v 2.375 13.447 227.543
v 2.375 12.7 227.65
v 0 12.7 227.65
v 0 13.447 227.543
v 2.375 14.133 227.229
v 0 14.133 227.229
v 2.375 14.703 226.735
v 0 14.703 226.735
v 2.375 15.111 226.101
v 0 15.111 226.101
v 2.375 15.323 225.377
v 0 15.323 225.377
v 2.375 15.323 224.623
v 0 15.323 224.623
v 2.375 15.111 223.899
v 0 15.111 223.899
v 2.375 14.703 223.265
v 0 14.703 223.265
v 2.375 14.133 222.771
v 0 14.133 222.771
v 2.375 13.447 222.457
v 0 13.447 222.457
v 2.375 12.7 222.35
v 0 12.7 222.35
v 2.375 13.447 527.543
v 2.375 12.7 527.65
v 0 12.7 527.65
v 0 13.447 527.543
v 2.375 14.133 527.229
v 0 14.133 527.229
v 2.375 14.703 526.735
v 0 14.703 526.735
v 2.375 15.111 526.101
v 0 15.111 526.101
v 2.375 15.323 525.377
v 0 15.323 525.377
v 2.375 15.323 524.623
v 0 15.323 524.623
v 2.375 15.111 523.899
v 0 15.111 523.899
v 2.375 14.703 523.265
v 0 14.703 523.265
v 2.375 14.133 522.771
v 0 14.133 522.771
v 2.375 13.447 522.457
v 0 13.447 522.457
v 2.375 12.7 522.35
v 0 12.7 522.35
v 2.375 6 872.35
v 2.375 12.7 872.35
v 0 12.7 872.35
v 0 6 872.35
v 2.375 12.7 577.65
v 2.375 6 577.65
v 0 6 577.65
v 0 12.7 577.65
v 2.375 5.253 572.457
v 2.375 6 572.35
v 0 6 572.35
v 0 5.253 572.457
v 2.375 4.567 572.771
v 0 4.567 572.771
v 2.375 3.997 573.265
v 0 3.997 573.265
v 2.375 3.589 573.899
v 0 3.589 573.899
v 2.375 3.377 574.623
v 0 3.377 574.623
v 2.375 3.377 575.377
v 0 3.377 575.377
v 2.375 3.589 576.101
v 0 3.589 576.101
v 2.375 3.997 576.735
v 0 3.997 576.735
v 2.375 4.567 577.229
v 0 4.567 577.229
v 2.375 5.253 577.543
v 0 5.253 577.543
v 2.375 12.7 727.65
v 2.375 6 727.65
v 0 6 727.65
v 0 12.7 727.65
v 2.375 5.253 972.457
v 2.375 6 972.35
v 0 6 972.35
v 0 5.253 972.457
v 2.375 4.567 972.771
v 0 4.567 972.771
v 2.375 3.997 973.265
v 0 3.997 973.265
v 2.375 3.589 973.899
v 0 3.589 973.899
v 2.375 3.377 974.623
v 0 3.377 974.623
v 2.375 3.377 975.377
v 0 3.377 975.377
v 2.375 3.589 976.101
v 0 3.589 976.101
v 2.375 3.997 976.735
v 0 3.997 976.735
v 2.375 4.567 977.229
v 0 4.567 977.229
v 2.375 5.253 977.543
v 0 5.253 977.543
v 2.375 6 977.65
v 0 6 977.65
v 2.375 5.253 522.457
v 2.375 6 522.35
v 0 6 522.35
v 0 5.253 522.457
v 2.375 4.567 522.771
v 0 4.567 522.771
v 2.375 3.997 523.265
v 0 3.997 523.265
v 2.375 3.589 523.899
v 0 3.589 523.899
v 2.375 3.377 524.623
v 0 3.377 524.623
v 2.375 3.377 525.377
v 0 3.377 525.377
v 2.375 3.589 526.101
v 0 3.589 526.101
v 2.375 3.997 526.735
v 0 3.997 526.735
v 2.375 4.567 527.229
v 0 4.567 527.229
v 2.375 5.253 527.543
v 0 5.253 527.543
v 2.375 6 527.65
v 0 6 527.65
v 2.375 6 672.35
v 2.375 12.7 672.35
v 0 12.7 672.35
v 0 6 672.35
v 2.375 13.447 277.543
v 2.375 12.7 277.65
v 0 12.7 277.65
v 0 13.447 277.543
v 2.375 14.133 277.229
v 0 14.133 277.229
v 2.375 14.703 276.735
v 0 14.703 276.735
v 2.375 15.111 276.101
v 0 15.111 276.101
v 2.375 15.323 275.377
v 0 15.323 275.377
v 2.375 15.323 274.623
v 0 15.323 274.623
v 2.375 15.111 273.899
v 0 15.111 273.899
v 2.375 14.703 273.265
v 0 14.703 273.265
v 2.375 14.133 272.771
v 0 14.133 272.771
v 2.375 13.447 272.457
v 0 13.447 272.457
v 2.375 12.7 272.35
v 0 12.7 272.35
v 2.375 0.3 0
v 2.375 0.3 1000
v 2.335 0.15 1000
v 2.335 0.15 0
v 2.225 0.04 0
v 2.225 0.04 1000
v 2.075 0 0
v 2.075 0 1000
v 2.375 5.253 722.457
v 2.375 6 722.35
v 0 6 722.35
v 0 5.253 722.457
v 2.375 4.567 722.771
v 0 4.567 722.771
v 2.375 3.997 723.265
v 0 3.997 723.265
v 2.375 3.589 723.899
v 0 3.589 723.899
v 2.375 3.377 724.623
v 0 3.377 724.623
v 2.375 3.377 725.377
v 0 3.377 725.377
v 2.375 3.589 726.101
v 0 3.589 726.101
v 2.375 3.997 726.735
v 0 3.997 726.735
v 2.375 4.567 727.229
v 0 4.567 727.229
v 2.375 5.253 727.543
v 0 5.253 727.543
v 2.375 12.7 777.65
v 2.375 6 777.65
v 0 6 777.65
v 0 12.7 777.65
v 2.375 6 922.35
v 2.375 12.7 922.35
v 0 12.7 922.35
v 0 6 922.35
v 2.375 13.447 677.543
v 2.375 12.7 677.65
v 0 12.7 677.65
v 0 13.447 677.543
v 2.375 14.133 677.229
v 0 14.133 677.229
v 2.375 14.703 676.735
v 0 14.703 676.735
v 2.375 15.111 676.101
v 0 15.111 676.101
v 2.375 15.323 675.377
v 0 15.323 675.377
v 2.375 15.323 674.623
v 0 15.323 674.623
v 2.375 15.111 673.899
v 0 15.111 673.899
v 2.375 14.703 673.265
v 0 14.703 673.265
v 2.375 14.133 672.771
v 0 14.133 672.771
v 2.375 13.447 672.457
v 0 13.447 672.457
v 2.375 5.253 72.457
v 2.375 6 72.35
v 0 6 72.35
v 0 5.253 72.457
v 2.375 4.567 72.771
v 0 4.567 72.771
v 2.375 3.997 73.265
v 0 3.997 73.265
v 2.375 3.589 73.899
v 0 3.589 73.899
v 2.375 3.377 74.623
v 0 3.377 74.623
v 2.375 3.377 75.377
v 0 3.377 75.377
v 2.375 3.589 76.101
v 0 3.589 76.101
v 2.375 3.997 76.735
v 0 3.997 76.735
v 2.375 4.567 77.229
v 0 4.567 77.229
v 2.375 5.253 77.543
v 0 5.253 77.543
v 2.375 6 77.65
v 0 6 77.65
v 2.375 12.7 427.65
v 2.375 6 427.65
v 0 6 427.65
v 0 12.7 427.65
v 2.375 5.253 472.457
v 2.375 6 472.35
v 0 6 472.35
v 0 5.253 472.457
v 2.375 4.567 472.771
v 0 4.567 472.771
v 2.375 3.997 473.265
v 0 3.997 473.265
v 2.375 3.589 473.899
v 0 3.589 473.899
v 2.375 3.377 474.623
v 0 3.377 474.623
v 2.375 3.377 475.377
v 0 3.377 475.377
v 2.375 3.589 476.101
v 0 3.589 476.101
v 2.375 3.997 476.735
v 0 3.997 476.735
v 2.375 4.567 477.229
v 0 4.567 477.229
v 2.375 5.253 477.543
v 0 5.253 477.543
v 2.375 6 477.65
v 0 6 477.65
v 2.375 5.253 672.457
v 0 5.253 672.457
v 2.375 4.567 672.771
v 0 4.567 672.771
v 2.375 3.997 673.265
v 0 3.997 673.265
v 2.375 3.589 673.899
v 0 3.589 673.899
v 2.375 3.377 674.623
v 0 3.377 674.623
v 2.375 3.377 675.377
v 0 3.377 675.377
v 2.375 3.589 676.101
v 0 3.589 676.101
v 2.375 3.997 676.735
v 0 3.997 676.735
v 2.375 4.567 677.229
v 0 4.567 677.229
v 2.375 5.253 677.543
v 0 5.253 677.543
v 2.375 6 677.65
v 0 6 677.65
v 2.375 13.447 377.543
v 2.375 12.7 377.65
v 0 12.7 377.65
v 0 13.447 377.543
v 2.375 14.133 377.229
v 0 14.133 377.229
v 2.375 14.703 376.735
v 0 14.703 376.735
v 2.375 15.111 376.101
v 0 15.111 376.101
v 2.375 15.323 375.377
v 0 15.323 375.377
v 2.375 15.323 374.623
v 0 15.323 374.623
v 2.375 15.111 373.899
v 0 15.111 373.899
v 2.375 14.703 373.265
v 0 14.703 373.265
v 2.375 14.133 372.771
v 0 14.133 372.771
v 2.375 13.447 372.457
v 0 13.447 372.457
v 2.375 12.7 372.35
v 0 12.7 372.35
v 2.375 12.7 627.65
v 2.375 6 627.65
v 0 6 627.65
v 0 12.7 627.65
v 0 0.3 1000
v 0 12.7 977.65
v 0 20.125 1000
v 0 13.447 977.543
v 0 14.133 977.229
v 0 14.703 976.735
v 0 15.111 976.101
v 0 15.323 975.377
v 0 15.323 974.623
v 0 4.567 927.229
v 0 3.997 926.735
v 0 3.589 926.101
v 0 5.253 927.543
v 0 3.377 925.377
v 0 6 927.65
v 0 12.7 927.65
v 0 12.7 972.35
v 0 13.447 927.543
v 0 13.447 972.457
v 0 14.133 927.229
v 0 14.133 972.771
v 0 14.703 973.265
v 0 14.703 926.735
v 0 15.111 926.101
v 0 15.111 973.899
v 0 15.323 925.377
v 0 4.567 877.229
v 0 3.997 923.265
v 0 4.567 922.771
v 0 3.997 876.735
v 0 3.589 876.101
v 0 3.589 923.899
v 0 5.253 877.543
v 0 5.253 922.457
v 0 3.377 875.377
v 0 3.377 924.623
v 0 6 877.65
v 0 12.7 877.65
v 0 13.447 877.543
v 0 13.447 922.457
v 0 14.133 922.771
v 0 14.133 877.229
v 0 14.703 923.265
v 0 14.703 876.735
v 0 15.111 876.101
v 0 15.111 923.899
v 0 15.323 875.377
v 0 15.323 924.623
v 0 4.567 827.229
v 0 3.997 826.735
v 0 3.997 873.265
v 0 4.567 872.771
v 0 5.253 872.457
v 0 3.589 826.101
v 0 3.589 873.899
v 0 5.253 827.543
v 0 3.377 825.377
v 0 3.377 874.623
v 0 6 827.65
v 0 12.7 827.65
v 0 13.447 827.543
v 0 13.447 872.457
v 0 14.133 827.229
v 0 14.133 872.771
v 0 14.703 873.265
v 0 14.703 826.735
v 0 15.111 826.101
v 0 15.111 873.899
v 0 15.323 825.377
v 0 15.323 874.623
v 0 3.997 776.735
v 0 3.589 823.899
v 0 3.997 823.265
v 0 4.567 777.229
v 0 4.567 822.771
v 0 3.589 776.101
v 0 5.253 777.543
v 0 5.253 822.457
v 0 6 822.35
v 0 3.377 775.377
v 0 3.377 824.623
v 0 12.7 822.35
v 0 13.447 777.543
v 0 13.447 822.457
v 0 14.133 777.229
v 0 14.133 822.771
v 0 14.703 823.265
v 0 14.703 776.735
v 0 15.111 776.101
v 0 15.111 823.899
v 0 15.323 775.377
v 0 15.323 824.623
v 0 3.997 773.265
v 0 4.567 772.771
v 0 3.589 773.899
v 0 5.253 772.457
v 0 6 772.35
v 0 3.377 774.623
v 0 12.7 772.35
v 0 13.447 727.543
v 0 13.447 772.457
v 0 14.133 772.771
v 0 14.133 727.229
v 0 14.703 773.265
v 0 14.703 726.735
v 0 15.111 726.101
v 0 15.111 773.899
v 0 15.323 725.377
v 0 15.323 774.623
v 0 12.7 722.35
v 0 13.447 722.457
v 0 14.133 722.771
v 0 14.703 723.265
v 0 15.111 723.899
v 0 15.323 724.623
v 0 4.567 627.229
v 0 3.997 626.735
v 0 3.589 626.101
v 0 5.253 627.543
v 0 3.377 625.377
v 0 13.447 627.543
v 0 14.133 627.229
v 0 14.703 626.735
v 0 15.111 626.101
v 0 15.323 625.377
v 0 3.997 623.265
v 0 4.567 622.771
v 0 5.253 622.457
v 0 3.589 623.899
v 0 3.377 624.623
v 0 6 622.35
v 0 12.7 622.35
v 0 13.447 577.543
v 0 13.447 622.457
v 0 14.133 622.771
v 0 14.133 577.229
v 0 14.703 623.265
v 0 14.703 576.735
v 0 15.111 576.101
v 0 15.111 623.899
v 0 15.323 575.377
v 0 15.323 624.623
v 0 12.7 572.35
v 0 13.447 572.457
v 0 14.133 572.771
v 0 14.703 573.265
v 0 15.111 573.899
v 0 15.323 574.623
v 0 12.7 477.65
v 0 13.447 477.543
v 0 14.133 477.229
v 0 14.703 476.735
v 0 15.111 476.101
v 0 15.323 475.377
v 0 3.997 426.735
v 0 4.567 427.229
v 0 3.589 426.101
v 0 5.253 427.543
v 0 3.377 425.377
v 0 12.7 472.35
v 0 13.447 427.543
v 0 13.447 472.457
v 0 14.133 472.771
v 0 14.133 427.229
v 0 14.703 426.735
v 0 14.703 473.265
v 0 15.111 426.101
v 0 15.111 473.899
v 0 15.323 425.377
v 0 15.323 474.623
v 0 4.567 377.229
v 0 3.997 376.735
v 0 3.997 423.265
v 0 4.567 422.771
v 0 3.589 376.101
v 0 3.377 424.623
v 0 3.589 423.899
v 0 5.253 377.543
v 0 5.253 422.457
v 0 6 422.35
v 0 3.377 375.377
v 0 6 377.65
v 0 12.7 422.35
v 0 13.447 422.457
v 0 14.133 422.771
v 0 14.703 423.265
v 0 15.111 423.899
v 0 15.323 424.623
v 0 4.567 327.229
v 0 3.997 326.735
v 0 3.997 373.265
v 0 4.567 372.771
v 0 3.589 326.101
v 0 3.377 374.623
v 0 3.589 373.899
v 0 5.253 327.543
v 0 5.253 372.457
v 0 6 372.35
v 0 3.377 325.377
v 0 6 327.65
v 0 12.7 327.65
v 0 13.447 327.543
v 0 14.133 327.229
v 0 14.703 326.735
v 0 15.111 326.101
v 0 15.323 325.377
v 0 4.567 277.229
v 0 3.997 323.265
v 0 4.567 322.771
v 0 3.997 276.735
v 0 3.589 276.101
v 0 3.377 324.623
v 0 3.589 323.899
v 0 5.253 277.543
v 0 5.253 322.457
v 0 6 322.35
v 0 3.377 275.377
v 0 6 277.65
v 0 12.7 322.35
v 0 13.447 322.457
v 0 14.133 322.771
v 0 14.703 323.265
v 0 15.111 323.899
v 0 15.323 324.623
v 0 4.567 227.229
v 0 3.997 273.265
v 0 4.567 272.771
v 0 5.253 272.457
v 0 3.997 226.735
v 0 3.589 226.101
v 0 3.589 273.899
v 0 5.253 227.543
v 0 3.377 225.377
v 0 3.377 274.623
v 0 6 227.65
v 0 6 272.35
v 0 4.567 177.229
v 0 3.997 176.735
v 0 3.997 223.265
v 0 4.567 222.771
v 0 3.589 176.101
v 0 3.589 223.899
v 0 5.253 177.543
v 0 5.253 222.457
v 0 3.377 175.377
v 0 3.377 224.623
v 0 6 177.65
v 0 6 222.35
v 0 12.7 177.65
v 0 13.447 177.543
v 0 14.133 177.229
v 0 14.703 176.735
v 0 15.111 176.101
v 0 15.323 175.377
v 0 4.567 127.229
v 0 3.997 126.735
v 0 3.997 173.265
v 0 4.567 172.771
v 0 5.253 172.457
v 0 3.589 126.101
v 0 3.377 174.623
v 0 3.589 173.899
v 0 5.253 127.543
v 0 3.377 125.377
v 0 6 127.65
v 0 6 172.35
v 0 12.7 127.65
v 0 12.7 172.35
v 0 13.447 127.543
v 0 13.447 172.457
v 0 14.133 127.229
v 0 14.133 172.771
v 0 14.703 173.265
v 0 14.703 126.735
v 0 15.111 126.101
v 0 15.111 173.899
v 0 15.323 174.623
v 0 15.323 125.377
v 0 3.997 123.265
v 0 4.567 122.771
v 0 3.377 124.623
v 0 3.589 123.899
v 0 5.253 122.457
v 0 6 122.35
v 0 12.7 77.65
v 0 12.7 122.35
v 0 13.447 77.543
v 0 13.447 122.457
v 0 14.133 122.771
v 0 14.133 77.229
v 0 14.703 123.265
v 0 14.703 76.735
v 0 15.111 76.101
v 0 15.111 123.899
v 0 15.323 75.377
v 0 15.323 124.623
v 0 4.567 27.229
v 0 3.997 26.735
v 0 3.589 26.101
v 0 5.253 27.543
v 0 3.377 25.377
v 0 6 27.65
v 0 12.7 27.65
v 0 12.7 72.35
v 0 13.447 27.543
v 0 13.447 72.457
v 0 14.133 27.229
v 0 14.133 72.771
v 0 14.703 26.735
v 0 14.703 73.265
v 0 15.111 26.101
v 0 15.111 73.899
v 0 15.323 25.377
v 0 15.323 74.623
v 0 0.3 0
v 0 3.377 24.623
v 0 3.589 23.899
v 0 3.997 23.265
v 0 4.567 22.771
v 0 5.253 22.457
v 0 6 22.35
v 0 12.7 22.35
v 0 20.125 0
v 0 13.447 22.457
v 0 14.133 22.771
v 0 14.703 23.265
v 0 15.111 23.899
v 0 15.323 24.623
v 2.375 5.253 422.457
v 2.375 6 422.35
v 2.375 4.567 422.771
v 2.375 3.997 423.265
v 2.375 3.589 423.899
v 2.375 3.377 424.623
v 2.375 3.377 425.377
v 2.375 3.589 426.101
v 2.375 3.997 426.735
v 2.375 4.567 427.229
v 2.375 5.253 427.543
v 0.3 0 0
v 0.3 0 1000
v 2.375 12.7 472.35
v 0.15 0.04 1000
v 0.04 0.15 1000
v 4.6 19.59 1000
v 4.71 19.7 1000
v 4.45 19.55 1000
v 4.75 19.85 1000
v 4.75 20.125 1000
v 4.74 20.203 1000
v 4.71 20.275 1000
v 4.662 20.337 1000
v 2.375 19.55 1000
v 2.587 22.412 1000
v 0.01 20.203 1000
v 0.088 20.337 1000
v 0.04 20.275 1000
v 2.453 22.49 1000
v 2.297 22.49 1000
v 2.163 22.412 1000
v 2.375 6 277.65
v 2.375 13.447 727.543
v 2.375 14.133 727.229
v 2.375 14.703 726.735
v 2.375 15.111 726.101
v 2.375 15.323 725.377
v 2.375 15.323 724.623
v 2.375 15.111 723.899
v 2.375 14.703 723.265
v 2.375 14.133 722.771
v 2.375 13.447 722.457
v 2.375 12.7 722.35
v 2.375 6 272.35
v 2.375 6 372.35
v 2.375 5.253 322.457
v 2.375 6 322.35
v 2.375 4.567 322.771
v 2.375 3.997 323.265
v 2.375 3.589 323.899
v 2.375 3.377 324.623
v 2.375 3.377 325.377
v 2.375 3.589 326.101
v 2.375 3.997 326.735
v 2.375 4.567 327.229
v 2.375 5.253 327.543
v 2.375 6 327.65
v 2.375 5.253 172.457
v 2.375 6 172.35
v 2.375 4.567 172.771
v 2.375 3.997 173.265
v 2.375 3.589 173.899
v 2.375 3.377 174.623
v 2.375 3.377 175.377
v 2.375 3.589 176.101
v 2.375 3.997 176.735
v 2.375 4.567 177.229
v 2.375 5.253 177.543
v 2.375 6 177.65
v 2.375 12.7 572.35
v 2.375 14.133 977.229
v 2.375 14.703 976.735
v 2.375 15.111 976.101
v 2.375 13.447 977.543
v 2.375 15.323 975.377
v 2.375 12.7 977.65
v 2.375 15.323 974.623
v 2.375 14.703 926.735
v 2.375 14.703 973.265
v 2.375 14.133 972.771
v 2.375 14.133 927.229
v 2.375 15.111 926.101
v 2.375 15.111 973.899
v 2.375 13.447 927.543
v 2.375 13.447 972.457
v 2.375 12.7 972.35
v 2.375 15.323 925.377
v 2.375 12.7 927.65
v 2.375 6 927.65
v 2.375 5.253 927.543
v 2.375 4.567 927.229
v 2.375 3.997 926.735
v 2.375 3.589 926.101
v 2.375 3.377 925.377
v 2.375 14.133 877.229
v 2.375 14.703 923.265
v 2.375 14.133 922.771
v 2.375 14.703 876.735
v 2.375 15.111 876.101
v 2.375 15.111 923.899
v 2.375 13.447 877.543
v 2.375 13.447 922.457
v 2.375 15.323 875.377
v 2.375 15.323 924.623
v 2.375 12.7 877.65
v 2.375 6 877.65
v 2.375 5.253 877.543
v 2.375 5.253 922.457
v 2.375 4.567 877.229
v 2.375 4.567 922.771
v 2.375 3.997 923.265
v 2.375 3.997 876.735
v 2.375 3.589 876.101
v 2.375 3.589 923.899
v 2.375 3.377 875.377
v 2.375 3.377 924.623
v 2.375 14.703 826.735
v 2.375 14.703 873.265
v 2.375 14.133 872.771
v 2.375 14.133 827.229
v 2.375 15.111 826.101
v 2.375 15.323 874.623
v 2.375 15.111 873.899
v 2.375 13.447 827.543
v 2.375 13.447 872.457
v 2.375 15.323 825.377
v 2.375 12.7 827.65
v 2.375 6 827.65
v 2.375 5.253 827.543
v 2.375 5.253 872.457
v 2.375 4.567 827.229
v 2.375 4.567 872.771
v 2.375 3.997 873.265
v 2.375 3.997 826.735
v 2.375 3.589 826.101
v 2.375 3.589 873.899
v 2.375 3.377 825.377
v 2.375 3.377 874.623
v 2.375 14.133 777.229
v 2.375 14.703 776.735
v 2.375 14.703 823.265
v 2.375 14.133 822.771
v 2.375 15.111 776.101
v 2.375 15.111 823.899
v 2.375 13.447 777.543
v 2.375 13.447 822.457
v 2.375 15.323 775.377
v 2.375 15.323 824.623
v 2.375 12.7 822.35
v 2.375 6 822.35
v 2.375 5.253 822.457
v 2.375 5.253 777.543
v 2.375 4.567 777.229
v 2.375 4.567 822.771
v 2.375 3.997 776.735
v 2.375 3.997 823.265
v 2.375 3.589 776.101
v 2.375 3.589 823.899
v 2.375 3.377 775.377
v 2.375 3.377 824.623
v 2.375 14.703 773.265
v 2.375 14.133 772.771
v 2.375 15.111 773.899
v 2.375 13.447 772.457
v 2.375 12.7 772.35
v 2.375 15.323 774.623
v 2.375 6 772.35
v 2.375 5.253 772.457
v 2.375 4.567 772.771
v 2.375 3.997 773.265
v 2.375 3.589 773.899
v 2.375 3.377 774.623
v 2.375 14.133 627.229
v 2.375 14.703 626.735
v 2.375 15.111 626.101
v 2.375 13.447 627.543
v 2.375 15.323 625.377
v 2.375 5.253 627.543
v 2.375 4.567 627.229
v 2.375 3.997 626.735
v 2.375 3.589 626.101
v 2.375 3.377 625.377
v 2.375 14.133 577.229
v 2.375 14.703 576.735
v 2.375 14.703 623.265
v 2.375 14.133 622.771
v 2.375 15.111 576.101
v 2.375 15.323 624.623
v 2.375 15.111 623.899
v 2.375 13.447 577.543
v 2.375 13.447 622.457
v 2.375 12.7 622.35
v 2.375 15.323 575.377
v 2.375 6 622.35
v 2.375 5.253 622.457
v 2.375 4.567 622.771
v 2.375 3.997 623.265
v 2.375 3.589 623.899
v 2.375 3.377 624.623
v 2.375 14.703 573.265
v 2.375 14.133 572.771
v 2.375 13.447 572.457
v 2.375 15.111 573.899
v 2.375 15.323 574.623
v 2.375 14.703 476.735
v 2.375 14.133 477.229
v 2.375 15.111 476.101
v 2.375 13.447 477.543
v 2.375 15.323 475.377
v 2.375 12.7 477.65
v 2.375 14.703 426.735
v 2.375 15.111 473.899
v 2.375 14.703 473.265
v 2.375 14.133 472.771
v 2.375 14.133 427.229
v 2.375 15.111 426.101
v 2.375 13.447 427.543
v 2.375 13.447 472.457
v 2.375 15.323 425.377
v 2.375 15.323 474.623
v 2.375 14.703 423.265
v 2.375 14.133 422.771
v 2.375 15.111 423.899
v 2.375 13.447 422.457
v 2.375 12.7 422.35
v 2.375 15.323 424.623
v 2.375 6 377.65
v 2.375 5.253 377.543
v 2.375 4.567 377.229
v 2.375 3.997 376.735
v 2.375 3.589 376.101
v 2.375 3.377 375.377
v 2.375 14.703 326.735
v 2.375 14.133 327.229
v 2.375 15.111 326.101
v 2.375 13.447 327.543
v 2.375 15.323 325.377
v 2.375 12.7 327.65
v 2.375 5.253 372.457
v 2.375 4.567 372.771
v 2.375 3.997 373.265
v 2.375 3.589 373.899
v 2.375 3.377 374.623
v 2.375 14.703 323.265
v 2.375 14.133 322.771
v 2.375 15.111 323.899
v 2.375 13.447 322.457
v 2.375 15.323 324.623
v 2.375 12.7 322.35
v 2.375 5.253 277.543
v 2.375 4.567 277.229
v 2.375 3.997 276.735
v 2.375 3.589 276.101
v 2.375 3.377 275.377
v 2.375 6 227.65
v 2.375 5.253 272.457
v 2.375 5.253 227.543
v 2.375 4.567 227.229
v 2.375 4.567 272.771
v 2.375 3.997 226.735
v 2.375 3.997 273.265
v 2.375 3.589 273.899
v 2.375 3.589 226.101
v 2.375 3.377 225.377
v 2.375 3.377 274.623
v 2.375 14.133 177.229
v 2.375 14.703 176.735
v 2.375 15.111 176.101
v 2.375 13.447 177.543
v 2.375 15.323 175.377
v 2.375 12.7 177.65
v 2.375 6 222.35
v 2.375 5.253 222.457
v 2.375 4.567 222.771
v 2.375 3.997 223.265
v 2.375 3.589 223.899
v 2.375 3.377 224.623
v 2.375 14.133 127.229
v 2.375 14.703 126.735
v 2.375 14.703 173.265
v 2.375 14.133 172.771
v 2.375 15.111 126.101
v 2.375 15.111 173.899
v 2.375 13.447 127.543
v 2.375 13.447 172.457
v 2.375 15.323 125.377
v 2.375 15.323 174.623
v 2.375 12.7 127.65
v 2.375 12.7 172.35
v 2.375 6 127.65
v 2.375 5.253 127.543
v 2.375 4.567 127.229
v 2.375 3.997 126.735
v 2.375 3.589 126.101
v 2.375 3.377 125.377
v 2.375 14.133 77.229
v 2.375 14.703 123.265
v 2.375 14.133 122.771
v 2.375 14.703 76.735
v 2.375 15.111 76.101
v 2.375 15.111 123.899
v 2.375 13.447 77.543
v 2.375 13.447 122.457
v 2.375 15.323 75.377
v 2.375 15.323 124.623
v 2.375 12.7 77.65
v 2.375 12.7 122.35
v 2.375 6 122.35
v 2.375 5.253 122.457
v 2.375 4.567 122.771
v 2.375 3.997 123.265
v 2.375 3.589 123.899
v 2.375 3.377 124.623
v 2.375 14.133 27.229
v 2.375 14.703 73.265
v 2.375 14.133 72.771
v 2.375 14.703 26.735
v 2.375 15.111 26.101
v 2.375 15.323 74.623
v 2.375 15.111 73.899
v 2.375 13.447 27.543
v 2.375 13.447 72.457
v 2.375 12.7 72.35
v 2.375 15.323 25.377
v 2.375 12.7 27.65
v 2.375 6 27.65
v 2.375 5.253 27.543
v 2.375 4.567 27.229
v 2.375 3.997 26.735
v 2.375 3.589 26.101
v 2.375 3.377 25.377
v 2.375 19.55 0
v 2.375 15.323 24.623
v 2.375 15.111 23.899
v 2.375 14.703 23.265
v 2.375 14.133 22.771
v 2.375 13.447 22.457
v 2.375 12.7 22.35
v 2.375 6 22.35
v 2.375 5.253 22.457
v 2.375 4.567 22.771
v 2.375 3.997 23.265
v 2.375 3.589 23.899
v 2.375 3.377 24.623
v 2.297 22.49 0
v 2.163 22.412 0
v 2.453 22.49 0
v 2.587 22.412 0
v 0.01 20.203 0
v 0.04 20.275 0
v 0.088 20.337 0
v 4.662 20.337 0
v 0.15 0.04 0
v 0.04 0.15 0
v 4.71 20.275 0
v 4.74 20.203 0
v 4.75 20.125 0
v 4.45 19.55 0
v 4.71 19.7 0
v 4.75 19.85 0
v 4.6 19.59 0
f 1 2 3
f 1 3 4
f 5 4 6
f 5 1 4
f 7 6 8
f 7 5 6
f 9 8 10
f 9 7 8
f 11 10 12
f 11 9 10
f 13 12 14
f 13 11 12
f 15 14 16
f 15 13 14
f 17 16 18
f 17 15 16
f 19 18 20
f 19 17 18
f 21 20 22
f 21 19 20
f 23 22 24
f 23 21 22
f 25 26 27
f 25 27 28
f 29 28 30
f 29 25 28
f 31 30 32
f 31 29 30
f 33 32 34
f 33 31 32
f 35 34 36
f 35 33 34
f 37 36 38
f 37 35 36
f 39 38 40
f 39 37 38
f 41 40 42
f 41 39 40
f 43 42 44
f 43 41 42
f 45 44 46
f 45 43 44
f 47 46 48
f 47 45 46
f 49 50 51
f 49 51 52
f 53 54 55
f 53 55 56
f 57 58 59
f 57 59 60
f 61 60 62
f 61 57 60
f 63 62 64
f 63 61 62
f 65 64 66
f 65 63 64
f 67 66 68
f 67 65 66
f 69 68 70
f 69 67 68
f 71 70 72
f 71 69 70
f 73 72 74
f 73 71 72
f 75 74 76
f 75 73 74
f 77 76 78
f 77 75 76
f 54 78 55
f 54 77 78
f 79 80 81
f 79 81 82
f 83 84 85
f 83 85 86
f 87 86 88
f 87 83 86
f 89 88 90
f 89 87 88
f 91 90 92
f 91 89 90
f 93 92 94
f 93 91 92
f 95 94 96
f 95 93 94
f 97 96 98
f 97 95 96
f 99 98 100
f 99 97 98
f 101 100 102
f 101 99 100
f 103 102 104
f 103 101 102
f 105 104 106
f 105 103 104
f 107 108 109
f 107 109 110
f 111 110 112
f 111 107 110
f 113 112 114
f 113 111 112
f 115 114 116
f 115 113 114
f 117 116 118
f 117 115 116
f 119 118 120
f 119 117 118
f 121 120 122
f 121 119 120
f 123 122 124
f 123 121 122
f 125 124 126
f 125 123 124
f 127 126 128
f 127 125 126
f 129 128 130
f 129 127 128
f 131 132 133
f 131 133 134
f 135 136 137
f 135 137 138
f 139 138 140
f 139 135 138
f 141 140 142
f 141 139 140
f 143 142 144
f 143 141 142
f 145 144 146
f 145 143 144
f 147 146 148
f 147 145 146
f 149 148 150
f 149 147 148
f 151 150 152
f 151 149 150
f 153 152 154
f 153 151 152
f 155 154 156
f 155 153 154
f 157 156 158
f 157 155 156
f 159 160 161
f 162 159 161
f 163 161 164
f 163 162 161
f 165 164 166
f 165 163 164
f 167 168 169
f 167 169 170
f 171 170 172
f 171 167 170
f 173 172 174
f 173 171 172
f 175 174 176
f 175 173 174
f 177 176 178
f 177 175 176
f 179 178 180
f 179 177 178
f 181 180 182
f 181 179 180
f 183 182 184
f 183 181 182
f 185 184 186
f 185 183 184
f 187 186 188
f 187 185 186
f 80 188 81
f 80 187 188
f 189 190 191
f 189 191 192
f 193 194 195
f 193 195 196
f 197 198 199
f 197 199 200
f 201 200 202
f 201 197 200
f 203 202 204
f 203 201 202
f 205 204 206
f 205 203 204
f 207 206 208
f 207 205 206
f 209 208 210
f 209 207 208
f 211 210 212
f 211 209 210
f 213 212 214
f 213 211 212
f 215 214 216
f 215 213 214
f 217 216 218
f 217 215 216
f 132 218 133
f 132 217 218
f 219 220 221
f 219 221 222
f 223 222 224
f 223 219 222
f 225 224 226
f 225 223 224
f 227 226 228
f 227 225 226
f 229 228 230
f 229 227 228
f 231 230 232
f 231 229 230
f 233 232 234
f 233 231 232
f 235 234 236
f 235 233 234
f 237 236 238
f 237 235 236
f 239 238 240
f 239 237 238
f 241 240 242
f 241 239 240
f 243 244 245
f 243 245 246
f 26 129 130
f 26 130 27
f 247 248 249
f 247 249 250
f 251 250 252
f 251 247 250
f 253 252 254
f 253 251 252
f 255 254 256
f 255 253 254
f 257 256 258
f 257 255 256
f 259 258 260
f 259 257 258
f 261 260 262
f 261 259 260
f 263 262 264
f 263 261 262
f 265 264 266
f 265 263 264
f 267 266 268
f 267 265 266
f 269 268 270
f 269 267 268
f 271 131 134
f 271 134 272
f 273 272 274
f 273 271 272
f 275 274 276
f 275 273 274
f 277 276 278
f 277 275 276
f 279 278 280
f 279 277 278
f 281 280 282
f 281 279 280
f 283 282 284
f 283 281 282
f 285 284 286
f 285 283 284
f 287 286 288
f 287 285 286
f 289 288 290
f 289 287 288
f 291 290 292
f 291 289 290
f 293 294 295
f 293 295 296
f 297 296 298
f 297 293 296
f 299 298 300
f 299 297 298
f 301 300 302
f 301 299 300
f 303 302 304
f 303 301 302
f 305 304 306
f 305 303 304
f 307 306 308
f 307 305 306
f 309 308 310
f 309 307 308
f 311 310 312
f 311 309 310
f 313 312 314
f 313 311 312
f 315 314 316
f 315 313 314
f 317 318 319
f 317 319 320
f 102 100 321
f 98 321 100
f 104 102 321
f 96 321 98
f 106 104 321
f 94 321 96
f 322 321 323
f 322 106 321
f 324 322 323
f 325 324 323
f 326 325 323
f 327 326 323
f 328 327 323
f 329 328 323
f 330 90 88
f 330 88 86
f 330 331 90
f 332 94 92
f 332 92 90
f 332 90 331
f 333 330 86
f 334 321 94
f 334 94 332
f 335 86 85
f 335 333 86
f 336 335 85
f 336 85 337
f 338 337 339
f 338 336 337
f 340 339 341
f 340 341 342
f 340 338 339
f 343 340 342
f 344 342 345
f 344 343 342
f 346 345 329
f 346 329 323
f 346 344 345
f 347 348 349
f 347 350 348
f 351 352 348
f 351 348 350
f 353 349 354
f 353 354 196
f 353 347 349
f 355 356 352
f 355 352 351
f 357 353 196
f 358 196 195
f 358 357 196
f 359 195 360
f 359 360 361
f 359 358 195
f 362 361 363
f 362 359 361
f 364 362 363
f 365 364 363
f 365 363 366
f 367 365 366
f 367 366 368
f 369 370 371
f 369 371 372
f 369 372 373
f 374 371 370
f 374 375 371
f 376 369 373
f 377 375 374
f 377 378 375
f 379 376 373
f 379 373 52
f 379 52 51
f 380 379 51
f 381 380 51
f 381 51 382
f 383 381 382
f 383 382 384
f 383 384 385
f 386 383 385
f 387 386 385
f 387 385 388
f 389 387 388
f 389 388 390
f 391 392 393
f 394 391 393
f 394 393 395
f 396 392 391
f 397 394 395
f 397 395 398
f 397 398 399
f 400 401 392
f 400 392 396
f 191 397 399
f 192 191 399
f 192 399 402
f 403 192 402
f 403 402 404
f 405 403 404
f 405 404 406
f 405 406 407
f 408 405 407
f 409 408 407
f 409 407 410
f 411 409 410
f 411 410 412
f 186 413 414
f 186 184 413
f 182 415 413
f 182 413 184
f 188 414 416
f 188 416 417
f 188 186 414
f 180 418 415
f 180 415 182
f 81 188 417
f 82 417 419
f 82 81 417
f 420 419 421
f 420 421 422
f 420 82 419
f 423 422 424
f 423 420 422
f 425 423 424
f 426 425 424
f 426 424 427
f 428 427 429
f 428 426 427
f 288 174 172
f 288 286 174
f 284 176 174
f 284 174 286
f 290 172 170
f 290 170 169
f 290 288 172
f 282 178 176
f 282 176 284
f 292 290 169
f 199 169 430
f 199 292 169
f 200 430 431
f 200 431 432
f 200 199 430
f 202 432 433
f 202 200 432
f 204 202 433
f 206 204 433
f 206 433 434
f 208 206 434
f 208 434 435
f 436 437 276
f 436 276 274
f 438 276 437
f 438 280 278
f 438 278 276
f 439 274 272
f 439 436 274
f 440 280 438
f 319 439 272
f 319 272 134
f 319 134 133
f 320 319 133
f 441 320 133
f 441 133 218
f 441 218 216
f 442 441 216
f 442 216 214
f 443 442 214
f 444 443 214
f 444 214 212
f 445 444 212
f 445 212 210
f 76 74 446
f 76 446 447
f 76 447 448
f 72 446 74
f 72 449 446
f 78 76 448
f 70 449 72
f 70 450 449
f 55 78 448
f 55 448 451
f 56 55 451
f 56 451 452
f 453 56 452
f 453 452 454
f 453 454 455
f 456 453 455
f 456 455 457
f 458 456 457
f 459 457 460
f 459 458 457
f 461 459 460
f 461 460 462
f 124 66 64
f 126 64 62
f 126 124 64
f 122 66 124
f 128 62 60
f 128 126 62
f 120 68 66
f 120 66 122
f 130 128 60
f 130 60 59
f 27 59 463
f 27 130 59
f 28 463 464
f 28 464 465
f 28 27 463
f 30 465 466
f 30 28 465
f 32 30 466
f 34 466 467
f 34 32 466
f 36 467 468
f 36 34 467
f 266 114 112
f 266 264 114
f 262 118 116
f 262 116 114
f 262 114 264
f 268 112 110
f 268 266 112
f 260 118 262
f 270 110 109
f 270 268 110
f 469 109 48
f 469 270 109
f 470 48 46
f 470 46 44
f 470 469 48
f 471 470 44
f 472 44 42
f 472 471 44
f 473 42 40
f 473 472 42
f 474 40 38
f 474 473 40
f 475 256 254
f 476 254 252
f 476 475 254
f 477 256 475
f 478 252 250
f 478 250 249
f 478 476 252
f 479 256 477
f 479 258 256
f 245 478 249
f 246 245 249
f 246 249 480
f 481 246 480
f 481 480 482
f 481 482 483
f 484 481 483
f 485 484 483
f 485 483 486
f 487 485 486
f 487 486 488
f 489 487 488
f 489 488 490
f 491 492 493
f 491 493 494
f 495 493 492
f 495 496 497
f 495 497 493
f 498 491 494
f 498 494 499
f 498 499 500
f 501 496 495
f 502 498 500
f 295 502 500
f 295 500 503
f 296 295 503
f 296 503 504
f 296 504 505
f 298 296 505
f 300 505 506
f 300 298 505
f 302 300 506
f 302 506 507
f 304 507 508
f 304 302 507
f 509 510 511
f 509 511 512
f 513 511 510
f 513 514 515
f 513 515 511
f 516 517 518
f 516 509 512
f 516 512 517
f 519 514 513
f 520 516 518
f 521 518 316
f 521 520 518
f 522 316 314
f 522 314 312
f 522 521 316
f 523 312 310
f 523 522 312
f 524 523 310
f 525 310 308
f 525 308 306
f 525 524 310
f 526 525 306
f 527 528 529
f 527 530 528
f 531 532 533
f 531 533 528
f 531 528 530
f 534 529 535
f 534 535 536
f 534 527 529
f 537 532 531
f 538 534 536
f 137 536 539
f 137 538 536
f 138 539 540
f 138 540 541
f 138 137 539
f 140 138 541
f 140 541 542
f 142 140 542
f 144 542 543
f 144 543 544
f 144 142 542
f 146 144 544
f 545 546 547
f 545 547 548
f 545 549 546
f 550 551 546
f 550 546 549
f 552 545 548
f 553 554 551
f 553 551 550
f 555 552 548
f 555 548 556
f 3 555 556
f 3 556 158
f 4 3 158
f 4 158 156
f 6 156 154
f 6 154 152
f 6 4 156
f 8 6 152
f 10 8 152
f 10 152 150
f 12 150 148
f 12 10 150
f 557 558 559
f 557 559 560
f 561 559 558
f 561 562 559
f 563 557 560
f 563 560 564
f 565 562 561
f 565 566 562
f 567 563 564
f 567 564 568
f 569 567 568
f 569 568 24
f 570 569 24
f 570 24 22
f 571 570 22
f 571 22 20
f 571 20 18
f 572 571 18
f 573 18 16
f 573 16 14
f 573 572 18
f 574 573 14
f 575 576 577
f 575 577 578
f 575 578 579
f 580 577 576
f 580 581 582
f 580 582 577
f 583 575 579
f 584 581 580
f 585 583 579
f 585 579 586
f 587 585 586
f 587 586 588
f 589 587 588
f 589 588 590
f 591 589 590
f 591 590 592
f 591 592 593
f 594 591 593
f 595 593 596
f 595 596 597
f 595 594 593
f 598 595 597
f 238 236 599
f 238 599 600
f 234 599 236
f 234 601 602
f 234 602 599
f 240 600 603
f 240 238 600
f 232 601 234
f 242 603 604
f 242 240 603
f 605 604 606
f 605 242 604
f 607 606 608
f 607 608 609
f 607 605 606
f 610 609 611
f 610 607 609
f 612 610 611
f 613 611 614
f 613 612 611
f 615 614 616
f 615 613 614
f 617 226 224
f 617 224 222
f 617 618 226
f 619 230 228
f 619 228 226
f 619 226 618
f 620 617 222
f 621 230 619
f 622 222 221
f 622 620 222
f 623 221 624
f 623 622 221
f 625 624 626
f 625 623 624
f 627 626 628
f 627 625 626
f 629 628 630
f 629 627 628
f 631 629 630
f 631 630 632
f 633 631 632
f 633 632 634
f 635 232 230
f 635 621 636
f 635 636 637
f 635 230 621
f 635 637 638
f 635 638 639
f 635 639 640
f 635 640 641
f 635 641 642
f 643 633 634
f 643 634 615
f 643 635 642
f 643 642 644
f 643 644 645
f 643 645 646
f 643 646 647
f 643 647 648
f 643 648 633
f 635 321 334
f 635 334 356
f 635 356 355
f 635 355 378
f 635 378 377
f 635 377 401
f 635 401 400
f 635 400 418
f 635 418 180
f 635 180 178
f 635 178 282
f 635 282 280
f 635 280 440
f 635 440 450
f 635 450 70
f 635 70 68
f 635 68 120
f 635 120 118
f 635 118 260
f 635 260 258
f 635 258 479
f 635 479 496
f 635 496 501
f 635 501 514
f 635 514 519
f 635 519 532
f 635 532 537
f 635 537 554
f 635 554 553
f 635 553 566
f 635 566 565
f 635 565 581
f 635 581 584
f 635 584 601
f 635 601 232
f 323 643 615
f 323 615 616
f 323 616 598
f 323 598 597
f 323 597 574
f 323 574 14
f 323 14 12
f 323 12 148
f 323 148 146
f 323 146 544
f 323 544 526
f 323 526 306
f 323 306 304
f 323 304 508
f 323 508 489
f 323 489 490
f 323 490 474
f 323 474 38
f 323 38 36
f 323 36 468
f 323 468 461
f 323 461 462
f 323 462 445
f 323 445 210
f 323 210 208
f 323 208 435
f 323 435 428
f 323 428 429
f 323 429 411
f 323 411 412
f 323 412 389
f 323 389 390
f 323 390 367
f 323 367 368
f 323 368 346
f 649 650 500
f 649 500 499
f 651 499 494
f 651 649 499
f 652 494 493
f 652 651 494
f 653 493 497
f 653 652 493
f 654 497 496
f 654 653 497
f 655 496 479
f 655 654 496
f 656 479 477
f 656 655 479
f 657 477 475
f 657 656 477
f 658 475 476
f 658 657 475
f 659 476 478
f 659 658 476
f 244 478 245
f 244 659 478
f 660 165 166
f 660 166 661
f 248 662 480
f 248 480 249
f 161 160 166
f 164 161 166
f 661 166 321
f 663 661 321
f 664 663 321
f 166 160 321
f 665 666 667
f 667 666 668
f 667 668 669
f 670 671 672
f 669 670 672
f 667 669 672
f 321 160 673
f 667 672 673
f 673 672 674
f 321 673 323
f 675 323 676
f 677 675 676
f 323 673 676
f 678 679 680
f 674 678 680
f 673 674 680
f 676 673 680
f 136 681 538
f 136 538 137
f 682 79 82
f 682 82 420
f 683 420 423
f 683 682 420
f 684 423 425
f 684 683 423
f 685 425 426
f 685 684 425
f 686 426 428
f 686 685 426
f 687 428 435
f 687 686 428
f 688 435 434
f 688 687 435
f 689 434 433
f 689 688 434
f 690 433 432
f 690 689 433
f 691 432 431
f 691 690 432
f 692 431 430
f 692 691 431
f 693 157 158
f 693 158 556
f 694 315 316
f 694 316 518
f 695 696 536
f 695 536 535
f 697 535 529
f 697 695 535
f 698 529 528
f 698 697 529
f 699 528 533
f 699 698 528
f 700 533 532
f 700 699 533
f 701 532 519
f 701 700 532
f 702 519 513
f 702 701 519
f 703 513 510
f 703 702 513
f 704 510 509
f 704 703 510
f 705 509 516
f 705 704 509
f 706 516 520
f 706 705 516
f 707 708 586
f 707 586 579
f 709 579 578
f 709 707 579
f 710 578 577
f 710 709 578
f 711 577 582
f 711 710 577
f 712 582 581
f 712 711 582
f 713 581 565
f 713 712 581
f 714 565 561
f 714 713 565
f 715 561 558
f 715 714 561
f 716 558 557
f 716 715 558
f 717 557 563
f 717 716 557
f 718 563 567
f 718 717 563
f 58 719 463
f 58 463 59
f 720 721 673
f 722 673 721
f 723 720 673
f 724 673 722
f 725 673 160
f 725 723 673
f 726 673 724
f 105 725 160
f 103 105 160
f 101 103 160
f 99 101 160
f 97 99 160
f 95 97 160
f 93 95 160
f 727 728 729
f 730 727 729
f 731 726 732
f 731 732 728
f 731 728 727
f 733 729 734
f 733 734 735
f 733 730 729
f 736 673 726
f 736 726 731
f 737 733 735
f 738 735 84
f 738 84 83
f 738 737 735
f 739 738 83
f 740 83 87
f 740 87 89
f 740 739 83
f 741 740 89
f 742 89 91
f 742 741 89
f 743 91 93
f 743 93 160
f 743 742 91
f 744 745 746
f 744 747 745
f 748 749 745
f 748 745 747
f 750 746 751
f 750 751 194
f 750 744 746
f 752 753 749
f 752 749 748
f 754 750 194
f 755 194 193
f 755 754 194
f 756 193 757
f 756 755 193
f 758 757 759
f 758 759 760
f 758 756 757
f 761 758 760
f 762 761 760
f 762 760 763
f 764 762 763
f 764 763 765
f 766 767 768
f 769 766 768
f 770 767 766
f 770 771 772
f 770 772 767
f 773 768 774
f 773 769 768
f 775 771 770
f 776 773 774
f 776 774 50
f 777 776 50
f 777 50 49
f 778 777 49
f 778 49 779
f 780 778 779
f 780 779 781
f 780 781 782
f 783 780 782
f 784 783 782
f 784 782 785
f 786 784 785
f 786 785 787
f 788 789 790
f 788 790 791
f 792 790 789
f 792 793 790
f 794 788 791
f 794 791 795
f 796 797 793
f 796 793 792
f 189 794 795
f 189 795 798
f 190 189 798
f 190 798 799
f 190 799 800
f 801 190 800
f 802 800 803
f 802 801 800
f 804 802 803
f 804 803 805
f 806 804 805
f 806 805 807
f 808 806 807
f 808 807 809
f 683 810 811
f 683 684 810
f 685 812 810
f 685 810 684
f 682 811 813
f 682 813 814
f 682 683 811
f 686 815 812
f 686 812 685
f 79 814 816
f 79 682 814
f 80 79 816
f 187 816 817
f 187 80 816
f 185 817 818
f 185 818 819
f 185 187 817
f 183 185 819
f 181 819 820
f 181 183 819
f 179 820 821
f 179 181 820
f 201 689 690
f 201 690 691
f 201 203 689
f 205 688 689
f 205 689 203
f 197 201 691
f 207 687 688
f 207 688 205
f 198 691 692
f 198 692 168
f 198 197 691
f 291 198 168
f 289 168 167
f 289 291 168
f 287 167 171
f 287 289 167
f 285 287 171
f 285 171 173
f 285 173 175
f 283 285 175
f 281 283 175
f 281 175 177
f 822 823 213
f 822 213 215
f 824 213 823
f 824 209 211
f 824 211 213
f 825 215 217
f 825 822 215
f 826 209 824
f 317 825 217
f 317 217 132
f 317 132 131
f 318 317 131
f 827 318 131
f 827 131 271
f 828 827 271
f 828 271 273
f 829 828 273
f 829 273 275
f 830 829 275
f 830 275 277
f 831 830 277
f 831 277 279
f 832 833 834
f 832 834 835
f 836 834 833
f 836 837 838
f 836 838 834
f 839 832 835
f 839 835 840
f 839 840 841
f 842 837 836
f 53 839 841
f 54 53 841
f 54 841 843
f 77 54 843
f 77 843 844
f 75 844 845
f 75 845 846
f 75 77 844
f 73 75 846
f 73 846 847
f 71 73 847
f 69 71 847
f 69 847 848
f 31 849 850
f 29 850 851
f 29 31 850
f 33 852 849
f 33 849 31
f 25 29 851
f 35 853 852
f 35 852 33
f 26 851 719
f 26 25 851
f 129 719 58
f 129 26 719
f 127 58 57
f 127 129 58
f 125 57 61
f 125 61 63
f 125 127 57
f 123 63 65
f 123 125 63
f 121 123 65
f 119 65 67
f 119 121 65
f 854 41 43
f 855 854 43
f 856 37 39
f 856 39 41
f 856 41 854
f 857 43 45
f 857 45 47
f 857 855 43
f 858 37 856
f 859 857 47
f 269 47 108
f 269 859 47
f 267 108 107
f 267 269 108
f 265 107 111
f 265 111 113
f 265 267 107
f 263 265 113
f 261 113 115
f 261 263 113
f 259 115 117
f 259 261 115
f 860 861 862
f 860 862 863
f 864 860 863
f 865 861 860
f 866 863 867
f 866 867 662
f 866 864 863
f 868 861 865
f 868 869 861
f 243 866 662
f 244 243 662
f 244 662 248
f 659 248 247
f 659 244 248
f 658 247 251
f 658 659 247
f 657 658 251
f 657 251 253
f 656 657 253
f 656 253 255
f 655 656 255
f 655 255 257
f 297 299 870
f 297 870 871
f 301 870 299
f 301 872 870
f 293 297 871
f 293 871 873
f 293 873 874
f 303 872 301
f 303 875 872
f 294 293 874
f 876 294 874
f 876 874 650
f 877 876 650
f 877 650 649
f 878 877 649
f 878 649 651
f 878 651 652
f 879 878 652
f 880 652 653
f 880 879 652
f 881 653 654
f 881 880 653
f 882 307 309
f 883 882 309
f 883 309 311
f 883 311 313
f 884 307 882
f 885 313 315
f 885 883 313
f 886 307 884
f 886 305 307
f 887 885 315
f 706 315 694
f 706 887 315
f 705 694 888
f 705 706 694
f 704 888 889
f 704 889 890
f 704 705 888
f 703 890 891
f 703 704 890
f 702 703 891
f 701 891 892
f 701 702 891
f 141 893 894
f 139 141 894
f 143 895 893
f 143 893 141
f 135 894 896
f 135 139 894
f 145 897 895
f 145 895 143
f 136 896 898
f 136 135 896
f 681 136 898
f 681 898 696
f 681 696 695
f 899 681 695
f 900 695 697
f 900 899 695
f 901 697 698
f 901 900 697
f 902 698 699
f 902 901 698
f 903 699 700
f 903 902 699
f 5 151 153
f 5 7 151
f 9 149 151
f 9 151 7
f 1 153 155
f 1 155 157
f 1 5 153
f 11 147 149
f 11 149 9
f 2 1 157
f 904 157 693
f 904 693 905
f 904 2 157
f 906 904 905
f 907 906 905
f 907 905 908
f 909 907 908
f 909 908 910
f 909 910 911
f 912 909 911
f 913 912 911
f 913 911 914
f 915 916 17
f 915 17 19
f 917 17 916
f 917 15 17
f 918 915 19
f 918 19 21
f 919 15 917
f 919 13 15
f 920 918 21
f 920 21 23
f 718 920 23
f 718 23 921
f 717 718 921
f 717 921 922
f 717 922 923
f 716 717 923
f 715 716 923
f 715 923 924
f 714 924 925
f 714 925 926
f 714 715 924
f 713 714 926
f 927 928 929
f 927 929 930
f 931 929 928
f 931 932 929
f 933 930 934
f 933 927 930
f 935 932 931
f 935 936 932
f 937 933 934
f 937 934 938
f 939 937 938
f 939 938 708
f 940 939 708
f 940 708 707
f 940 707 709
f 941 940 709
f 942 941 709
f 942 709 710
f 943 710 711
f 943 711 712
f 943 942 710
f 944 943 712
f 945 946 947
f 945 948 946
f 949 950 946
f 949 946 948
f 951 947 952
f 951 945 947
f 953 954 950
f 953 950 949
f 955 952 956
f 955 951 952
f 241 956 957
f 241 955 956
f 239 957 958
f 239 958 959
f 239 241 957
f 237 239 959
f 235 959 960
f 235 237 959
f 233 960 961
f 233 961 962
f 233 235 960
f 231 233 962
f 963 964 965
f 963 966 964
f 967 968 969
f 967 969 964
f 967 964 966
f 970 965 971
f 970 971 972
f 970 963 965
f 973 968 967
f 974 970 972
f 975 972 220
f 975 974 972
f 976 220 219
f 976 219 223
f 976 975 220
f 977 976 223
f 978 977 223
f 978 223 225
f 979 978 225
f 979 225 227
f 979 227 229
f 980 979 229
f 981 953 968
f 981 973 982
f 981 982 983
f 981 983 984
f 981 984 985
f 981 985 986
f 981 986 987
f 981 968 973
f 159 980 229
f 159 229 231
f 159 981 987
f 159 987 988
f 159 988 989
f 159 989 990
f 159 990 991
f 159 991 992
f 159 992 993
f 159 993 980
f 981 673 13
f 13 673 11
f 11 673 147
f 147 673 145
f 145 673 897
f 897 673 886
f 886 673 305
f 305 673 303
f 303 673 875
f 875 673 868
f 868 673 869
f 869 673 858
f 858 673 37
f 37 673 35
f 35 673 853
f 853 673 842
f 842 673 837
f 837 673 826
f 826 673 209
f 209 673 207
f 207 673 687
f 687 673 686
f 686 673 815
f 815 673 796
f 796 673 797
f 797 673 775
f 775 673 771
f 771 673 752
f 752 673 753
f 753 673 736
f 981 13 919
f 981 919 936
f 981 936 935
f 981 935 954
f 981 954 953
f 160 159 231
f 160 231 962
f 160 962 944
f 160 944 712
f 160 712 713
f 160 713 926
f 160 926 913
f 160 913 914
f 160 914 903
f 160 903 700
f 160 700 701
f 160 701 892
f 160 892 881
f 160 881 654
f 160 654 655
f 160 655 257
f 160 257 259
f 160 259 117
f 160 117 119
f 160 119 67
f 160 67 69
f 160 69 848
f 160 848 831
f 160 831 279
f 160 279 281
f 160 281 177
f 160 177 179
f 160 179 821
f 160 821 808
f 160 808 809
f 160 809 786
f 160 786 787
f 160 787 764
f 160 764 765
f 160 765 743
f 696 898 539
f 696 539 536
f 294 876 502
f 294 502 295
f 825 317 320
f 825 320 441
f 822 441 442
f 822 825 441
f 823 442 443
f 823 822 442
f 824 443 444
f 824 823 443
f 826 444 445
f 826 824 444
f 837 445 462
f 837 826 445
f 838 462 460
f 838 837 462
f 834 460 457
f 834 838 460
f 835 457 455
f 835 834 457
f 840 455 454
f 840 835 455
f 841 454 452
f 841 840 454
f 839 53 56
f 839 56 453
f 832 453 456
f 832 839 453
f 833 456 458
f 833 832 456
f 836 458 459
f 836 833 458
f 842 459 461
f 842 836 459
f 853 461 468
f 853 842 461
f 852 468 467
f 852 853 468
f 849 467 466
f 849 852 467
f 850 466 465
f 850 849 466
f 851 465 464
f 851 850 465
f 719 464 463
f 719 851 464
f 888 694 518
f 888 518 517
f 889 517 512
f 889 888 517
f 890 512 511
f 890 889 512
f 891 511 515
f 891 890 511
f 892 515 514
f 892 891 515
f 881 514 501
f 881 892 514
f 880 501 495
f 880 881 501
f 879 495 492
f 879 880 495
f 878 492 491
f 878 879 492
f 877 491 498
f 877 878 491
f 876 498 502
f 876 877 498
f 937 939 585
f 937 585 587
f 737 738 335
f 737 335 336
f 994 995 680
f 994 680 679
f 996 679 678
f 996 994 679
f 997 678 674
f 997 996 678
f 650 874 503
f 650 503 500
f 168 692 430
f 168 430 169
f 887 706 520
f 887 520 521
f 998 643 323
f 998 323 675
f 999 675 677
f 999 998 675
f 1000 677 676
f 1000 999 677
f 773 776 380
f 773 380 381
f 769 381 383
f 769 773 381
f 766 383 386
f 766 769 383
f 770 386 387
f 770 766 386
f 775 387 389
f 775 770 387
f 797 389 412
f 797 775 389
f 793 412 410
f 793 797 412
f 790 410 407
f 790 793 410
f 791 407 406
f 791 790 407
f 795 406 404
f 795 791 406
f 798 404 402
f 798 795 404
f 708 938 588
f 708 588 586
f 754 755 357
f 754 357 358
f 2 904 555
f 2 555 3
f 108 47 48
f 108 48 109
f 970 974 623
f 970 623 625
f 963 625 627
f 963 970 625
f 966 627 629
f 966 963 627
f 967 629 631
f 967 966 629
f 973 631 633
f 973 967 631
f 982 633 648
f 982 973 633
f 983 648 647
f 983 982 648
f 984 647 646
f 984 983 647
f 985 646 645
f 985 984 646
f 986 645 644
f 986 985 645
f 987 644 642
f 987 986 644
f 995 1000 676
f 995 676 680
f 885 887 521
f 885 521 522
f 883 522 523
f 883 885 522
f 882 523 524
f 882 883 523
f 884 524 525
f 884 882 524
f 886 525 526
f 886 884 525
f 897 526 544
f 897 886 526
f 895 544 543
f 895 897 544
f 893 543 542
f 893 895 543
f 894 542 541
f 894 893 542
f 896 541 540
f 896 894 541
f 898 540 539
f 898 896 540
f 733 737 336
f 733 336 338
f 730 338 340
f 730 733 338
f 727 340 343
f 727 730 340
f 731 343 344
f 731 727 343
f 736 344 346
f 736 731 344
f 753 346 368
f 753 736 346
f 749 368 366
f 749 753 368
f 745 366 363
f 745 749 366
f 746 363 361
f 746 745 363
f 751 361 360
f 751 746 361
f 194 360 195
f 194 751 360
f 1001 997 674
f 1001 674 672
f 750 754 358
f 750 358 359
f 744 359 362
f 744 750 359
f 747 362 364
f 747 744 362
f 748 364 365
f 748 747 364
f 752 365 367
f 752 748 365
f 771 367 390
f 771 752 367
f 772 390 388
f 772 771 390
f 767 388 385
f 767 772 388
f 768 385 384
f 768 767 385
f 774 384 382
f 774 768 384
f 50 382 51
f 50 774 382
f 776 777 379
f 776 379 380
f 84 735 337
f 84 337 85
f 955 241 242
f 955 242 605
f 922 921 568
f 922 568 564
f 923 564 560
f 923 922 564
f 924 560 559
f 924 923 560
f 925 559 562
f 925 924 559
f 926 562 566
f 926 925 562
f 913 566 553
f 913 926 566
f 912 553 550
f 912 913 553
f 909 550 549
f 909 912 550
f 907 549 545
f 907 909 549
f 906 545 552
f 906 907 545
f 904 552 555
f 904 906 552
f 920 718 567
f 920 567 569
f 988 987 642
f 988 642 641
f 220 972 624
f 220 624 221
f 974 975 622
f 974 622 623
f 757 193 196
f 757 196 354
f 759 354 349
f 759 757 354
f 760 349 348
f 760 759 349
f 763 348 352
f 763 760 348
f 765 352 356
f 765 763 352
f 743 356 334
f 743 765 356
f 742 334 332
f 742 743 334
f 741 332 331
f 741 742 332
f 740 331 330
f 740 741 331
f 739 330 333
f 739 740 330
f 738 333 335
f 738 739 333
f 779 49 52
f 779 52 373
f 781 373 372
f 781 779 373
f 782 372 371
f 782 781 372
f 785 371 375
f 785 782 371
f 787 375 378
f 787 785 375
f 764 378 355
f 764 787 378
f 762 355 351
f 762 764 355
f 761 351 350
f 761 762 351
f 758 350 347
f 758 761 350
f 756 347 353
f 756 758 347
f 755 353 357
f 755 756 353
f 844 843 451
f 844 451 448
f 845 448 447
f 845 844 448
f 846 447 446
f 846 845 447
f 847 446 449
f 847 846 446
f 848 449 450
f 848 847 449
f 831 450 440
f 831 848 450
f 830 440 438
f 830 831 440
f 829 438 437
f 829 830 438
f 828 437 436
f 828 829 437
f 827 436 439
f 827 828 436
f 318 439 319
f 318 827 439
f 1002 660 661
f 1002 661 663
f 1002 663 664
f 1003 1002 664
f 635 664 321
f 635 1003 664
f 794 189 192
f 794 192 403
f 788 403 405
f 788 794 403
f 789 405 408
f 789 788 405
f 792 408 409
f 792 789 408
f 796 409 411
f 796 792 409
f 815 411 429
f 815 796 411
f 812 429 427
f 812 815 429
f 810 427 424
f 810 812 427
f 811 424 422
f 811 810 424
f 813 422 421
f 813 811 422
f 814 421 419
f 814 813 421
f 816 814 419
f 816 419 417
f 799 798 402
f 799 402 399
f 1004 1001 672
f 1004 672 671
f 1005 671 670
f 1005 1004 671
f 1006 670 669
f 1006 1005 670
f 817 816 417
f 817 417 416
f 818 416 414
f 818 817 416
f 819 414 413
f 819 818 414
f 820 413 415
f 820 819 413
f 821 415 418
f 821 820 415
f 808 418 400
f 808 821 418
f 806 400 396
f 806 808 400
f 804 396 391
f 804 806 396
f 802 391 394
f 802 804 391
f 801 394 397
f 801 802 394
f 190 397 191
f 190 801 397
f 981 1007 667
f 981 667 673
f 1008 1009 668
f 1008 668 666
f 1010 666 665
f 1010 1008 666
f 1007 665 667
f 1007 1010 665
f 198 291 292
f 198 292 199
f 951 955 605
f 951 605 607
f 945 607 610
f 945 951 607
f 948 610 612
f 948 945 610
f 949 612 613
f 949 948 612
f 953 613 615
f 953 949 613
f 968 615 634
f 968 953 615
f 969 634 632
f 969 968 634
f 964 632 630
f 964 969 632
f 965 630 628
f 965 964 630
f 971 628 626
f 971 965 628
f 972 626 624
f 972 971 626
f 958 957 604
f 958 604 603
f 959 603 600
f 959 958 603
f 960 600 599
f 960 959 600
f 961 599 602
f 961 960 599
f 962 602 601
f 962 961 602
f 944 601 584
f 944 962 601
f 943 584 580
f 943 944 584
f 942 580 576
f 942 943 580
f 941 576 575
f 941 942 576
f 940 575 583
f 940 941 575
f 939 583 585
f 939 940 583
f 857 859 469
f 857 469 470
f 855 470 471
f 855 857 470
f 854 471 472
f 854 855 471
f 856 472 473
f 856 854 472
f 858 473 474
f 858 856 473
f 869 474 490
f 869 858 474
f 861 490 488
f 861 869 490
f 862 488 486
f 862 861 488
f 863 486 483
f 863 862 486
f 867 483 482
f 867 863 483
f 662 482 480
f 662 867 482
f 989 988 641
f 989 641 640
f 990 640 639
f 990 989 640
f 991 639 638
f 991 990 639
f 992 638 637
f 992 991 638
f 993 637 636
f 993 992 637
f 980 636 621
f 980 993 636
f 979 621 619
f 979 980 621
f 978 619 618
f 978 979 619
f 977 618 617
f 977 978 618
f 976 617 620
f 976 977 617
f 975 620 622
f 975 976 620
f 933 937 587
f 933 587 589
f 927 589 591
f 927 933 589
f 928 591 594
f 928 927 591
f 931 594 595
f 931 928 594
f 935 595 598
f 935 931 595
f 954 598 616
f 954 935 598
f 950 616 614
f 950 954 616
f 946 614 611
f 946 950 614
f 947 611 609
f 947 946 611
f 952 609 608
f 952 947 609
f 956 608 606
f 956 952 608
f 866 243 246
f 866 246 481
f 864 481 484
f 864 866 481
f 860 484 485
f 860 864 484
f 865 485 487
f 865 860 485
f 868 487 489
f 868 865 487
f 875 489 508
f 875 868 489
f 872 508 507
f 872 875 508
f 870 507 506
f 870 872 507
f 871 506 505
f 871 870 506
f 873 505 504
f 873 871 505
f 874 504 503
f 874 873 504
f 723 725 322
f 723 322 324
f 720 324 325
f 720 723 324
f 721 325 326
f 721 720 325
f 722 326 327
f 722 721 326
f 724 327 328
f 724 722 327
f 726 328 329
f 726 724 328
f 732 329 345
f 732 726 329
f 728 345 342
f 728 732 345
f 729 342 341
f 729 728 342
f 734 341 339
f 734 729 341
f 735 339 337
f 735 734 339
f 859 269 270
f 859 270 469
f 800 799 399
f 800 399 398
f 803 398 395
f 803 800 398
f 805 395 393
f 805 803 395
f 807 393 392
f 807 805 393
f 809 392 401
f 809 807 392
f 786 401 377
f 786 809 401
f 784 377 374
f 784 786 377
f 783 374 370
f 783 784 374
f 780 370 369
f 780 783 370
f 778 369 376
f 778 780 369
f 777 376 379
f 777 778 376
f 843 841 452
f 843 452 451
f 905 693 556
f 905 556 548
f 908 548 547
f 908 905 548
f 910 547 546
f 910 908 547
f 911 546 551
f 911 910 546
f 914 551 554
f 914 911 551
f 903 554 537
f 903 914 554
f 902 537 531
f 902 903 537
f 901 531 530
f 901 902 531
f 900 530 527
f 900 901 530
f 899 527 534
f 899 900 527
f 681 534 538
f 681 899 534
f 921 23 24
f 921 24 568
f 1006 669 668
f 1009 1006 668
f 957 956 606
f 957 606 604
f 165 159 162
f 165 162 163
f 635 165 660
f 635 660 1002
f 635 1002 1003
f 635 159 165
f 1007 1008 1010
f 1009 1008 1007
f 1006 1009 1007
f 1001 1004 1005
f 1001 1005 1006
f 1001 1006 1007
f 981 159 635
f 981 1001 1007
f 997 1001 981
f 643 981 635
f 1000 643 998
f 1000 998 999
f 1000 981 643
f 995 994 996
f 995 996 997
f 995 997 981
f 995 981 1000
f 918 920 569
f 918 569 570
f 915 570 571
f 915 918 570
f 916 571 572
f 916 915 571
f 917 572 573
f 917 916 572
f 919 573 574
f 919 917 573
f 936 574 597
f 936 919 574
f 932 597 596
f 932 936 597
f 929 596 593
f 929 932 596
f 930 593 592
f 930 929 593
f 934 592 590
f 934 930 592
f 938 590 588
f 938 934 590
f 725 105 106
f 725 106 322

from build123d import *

# Parameters (mm, degrees)
BOSS_EXTRUDE1_DEPTH = 1000
CUT_EXTRUDE1_DEPTH  = 3.375
LPATTERN1_COUNT     = 20
LPATTERN1_PITCH     = 50


with BuildPart() as part:
    # Sketch1 → Boss-Extrude1 (new body)
    with BuildSketch(Plane.XY):
        with BuildLine():
            Line((0, 0.3), (0, 20.125))
            ThreePointArc((0, 20.125), (0.02283614, 20.23980503), (0.087867966, 20.337132034))
            Line((0.087867966, 20.337132034), (2.162867966, 22.412132034))
            ThreePointArc((2.162867966, 22.412132034), (2.375, 22.5), (2.587132034, 22.412132034))
            Line((2.587132034, 22.412132034), (4.662132034, 20.337132034))
            ThreePointArc((4.662132034, 20.337132034), (4.72716386, 20.23980503), (4.75, 20.125))
            Line((4.75, 20.125), (4.75, 19.85))
            ThreePointArc((4.75, 19.85), (4.662132034, 19.637867966), (4.45, 19.55))
            Line((4.45, 19.55), (2.375, 19.55))
            Line((2.375, 19.55), (2.375, 0.3))
            ThreePointArc((2.375, 0.3), (2.287132034, 0.087867966), (2.075, 0))
            Line((2.075, 0), (0.3, 0))
            ThreePointArc((0.3, 0), (0.087867966, 0.087867966), (0, 0.3))
        make_face()
    extrude(amount=BOSS_EXTRUDE1_DEPTH)

    # Sketch2 → Cut-Extrude1 (cut, through all)
    with BuildSketch(Plane(origin=(2.375, 0, 0), x_dir=(0, 0, -1), z_dir=(1, 0, 0))):
        with BuildLine():
            Line((-22.35, 12.7), (-22.35, 6))
            ThreePointArc((-22.35, 6), (-25, 3.35), (-27.65, 6))
            Line((-27.65, 6), (-27.65, 12.7))
            ThreePointArc((-27.65, 12.7), (-25, 15.35), (-22.35, 12.7))
        make_face()
    cut_extrude1 = extrude(amount=-CUT_EXTRUDE1_DEPTH, mode=Mode.SUBTRACT)

    # LPattern1: Cut-Extrude1 ×20
    with Locations(*[(0, 0, i * LPATTERN1_PITCH) for i in range(1, LPATTERN1_COUNT)]):
        add(cut_extrude1, mode=Mode.SUBTRACT)


solid = part.part
